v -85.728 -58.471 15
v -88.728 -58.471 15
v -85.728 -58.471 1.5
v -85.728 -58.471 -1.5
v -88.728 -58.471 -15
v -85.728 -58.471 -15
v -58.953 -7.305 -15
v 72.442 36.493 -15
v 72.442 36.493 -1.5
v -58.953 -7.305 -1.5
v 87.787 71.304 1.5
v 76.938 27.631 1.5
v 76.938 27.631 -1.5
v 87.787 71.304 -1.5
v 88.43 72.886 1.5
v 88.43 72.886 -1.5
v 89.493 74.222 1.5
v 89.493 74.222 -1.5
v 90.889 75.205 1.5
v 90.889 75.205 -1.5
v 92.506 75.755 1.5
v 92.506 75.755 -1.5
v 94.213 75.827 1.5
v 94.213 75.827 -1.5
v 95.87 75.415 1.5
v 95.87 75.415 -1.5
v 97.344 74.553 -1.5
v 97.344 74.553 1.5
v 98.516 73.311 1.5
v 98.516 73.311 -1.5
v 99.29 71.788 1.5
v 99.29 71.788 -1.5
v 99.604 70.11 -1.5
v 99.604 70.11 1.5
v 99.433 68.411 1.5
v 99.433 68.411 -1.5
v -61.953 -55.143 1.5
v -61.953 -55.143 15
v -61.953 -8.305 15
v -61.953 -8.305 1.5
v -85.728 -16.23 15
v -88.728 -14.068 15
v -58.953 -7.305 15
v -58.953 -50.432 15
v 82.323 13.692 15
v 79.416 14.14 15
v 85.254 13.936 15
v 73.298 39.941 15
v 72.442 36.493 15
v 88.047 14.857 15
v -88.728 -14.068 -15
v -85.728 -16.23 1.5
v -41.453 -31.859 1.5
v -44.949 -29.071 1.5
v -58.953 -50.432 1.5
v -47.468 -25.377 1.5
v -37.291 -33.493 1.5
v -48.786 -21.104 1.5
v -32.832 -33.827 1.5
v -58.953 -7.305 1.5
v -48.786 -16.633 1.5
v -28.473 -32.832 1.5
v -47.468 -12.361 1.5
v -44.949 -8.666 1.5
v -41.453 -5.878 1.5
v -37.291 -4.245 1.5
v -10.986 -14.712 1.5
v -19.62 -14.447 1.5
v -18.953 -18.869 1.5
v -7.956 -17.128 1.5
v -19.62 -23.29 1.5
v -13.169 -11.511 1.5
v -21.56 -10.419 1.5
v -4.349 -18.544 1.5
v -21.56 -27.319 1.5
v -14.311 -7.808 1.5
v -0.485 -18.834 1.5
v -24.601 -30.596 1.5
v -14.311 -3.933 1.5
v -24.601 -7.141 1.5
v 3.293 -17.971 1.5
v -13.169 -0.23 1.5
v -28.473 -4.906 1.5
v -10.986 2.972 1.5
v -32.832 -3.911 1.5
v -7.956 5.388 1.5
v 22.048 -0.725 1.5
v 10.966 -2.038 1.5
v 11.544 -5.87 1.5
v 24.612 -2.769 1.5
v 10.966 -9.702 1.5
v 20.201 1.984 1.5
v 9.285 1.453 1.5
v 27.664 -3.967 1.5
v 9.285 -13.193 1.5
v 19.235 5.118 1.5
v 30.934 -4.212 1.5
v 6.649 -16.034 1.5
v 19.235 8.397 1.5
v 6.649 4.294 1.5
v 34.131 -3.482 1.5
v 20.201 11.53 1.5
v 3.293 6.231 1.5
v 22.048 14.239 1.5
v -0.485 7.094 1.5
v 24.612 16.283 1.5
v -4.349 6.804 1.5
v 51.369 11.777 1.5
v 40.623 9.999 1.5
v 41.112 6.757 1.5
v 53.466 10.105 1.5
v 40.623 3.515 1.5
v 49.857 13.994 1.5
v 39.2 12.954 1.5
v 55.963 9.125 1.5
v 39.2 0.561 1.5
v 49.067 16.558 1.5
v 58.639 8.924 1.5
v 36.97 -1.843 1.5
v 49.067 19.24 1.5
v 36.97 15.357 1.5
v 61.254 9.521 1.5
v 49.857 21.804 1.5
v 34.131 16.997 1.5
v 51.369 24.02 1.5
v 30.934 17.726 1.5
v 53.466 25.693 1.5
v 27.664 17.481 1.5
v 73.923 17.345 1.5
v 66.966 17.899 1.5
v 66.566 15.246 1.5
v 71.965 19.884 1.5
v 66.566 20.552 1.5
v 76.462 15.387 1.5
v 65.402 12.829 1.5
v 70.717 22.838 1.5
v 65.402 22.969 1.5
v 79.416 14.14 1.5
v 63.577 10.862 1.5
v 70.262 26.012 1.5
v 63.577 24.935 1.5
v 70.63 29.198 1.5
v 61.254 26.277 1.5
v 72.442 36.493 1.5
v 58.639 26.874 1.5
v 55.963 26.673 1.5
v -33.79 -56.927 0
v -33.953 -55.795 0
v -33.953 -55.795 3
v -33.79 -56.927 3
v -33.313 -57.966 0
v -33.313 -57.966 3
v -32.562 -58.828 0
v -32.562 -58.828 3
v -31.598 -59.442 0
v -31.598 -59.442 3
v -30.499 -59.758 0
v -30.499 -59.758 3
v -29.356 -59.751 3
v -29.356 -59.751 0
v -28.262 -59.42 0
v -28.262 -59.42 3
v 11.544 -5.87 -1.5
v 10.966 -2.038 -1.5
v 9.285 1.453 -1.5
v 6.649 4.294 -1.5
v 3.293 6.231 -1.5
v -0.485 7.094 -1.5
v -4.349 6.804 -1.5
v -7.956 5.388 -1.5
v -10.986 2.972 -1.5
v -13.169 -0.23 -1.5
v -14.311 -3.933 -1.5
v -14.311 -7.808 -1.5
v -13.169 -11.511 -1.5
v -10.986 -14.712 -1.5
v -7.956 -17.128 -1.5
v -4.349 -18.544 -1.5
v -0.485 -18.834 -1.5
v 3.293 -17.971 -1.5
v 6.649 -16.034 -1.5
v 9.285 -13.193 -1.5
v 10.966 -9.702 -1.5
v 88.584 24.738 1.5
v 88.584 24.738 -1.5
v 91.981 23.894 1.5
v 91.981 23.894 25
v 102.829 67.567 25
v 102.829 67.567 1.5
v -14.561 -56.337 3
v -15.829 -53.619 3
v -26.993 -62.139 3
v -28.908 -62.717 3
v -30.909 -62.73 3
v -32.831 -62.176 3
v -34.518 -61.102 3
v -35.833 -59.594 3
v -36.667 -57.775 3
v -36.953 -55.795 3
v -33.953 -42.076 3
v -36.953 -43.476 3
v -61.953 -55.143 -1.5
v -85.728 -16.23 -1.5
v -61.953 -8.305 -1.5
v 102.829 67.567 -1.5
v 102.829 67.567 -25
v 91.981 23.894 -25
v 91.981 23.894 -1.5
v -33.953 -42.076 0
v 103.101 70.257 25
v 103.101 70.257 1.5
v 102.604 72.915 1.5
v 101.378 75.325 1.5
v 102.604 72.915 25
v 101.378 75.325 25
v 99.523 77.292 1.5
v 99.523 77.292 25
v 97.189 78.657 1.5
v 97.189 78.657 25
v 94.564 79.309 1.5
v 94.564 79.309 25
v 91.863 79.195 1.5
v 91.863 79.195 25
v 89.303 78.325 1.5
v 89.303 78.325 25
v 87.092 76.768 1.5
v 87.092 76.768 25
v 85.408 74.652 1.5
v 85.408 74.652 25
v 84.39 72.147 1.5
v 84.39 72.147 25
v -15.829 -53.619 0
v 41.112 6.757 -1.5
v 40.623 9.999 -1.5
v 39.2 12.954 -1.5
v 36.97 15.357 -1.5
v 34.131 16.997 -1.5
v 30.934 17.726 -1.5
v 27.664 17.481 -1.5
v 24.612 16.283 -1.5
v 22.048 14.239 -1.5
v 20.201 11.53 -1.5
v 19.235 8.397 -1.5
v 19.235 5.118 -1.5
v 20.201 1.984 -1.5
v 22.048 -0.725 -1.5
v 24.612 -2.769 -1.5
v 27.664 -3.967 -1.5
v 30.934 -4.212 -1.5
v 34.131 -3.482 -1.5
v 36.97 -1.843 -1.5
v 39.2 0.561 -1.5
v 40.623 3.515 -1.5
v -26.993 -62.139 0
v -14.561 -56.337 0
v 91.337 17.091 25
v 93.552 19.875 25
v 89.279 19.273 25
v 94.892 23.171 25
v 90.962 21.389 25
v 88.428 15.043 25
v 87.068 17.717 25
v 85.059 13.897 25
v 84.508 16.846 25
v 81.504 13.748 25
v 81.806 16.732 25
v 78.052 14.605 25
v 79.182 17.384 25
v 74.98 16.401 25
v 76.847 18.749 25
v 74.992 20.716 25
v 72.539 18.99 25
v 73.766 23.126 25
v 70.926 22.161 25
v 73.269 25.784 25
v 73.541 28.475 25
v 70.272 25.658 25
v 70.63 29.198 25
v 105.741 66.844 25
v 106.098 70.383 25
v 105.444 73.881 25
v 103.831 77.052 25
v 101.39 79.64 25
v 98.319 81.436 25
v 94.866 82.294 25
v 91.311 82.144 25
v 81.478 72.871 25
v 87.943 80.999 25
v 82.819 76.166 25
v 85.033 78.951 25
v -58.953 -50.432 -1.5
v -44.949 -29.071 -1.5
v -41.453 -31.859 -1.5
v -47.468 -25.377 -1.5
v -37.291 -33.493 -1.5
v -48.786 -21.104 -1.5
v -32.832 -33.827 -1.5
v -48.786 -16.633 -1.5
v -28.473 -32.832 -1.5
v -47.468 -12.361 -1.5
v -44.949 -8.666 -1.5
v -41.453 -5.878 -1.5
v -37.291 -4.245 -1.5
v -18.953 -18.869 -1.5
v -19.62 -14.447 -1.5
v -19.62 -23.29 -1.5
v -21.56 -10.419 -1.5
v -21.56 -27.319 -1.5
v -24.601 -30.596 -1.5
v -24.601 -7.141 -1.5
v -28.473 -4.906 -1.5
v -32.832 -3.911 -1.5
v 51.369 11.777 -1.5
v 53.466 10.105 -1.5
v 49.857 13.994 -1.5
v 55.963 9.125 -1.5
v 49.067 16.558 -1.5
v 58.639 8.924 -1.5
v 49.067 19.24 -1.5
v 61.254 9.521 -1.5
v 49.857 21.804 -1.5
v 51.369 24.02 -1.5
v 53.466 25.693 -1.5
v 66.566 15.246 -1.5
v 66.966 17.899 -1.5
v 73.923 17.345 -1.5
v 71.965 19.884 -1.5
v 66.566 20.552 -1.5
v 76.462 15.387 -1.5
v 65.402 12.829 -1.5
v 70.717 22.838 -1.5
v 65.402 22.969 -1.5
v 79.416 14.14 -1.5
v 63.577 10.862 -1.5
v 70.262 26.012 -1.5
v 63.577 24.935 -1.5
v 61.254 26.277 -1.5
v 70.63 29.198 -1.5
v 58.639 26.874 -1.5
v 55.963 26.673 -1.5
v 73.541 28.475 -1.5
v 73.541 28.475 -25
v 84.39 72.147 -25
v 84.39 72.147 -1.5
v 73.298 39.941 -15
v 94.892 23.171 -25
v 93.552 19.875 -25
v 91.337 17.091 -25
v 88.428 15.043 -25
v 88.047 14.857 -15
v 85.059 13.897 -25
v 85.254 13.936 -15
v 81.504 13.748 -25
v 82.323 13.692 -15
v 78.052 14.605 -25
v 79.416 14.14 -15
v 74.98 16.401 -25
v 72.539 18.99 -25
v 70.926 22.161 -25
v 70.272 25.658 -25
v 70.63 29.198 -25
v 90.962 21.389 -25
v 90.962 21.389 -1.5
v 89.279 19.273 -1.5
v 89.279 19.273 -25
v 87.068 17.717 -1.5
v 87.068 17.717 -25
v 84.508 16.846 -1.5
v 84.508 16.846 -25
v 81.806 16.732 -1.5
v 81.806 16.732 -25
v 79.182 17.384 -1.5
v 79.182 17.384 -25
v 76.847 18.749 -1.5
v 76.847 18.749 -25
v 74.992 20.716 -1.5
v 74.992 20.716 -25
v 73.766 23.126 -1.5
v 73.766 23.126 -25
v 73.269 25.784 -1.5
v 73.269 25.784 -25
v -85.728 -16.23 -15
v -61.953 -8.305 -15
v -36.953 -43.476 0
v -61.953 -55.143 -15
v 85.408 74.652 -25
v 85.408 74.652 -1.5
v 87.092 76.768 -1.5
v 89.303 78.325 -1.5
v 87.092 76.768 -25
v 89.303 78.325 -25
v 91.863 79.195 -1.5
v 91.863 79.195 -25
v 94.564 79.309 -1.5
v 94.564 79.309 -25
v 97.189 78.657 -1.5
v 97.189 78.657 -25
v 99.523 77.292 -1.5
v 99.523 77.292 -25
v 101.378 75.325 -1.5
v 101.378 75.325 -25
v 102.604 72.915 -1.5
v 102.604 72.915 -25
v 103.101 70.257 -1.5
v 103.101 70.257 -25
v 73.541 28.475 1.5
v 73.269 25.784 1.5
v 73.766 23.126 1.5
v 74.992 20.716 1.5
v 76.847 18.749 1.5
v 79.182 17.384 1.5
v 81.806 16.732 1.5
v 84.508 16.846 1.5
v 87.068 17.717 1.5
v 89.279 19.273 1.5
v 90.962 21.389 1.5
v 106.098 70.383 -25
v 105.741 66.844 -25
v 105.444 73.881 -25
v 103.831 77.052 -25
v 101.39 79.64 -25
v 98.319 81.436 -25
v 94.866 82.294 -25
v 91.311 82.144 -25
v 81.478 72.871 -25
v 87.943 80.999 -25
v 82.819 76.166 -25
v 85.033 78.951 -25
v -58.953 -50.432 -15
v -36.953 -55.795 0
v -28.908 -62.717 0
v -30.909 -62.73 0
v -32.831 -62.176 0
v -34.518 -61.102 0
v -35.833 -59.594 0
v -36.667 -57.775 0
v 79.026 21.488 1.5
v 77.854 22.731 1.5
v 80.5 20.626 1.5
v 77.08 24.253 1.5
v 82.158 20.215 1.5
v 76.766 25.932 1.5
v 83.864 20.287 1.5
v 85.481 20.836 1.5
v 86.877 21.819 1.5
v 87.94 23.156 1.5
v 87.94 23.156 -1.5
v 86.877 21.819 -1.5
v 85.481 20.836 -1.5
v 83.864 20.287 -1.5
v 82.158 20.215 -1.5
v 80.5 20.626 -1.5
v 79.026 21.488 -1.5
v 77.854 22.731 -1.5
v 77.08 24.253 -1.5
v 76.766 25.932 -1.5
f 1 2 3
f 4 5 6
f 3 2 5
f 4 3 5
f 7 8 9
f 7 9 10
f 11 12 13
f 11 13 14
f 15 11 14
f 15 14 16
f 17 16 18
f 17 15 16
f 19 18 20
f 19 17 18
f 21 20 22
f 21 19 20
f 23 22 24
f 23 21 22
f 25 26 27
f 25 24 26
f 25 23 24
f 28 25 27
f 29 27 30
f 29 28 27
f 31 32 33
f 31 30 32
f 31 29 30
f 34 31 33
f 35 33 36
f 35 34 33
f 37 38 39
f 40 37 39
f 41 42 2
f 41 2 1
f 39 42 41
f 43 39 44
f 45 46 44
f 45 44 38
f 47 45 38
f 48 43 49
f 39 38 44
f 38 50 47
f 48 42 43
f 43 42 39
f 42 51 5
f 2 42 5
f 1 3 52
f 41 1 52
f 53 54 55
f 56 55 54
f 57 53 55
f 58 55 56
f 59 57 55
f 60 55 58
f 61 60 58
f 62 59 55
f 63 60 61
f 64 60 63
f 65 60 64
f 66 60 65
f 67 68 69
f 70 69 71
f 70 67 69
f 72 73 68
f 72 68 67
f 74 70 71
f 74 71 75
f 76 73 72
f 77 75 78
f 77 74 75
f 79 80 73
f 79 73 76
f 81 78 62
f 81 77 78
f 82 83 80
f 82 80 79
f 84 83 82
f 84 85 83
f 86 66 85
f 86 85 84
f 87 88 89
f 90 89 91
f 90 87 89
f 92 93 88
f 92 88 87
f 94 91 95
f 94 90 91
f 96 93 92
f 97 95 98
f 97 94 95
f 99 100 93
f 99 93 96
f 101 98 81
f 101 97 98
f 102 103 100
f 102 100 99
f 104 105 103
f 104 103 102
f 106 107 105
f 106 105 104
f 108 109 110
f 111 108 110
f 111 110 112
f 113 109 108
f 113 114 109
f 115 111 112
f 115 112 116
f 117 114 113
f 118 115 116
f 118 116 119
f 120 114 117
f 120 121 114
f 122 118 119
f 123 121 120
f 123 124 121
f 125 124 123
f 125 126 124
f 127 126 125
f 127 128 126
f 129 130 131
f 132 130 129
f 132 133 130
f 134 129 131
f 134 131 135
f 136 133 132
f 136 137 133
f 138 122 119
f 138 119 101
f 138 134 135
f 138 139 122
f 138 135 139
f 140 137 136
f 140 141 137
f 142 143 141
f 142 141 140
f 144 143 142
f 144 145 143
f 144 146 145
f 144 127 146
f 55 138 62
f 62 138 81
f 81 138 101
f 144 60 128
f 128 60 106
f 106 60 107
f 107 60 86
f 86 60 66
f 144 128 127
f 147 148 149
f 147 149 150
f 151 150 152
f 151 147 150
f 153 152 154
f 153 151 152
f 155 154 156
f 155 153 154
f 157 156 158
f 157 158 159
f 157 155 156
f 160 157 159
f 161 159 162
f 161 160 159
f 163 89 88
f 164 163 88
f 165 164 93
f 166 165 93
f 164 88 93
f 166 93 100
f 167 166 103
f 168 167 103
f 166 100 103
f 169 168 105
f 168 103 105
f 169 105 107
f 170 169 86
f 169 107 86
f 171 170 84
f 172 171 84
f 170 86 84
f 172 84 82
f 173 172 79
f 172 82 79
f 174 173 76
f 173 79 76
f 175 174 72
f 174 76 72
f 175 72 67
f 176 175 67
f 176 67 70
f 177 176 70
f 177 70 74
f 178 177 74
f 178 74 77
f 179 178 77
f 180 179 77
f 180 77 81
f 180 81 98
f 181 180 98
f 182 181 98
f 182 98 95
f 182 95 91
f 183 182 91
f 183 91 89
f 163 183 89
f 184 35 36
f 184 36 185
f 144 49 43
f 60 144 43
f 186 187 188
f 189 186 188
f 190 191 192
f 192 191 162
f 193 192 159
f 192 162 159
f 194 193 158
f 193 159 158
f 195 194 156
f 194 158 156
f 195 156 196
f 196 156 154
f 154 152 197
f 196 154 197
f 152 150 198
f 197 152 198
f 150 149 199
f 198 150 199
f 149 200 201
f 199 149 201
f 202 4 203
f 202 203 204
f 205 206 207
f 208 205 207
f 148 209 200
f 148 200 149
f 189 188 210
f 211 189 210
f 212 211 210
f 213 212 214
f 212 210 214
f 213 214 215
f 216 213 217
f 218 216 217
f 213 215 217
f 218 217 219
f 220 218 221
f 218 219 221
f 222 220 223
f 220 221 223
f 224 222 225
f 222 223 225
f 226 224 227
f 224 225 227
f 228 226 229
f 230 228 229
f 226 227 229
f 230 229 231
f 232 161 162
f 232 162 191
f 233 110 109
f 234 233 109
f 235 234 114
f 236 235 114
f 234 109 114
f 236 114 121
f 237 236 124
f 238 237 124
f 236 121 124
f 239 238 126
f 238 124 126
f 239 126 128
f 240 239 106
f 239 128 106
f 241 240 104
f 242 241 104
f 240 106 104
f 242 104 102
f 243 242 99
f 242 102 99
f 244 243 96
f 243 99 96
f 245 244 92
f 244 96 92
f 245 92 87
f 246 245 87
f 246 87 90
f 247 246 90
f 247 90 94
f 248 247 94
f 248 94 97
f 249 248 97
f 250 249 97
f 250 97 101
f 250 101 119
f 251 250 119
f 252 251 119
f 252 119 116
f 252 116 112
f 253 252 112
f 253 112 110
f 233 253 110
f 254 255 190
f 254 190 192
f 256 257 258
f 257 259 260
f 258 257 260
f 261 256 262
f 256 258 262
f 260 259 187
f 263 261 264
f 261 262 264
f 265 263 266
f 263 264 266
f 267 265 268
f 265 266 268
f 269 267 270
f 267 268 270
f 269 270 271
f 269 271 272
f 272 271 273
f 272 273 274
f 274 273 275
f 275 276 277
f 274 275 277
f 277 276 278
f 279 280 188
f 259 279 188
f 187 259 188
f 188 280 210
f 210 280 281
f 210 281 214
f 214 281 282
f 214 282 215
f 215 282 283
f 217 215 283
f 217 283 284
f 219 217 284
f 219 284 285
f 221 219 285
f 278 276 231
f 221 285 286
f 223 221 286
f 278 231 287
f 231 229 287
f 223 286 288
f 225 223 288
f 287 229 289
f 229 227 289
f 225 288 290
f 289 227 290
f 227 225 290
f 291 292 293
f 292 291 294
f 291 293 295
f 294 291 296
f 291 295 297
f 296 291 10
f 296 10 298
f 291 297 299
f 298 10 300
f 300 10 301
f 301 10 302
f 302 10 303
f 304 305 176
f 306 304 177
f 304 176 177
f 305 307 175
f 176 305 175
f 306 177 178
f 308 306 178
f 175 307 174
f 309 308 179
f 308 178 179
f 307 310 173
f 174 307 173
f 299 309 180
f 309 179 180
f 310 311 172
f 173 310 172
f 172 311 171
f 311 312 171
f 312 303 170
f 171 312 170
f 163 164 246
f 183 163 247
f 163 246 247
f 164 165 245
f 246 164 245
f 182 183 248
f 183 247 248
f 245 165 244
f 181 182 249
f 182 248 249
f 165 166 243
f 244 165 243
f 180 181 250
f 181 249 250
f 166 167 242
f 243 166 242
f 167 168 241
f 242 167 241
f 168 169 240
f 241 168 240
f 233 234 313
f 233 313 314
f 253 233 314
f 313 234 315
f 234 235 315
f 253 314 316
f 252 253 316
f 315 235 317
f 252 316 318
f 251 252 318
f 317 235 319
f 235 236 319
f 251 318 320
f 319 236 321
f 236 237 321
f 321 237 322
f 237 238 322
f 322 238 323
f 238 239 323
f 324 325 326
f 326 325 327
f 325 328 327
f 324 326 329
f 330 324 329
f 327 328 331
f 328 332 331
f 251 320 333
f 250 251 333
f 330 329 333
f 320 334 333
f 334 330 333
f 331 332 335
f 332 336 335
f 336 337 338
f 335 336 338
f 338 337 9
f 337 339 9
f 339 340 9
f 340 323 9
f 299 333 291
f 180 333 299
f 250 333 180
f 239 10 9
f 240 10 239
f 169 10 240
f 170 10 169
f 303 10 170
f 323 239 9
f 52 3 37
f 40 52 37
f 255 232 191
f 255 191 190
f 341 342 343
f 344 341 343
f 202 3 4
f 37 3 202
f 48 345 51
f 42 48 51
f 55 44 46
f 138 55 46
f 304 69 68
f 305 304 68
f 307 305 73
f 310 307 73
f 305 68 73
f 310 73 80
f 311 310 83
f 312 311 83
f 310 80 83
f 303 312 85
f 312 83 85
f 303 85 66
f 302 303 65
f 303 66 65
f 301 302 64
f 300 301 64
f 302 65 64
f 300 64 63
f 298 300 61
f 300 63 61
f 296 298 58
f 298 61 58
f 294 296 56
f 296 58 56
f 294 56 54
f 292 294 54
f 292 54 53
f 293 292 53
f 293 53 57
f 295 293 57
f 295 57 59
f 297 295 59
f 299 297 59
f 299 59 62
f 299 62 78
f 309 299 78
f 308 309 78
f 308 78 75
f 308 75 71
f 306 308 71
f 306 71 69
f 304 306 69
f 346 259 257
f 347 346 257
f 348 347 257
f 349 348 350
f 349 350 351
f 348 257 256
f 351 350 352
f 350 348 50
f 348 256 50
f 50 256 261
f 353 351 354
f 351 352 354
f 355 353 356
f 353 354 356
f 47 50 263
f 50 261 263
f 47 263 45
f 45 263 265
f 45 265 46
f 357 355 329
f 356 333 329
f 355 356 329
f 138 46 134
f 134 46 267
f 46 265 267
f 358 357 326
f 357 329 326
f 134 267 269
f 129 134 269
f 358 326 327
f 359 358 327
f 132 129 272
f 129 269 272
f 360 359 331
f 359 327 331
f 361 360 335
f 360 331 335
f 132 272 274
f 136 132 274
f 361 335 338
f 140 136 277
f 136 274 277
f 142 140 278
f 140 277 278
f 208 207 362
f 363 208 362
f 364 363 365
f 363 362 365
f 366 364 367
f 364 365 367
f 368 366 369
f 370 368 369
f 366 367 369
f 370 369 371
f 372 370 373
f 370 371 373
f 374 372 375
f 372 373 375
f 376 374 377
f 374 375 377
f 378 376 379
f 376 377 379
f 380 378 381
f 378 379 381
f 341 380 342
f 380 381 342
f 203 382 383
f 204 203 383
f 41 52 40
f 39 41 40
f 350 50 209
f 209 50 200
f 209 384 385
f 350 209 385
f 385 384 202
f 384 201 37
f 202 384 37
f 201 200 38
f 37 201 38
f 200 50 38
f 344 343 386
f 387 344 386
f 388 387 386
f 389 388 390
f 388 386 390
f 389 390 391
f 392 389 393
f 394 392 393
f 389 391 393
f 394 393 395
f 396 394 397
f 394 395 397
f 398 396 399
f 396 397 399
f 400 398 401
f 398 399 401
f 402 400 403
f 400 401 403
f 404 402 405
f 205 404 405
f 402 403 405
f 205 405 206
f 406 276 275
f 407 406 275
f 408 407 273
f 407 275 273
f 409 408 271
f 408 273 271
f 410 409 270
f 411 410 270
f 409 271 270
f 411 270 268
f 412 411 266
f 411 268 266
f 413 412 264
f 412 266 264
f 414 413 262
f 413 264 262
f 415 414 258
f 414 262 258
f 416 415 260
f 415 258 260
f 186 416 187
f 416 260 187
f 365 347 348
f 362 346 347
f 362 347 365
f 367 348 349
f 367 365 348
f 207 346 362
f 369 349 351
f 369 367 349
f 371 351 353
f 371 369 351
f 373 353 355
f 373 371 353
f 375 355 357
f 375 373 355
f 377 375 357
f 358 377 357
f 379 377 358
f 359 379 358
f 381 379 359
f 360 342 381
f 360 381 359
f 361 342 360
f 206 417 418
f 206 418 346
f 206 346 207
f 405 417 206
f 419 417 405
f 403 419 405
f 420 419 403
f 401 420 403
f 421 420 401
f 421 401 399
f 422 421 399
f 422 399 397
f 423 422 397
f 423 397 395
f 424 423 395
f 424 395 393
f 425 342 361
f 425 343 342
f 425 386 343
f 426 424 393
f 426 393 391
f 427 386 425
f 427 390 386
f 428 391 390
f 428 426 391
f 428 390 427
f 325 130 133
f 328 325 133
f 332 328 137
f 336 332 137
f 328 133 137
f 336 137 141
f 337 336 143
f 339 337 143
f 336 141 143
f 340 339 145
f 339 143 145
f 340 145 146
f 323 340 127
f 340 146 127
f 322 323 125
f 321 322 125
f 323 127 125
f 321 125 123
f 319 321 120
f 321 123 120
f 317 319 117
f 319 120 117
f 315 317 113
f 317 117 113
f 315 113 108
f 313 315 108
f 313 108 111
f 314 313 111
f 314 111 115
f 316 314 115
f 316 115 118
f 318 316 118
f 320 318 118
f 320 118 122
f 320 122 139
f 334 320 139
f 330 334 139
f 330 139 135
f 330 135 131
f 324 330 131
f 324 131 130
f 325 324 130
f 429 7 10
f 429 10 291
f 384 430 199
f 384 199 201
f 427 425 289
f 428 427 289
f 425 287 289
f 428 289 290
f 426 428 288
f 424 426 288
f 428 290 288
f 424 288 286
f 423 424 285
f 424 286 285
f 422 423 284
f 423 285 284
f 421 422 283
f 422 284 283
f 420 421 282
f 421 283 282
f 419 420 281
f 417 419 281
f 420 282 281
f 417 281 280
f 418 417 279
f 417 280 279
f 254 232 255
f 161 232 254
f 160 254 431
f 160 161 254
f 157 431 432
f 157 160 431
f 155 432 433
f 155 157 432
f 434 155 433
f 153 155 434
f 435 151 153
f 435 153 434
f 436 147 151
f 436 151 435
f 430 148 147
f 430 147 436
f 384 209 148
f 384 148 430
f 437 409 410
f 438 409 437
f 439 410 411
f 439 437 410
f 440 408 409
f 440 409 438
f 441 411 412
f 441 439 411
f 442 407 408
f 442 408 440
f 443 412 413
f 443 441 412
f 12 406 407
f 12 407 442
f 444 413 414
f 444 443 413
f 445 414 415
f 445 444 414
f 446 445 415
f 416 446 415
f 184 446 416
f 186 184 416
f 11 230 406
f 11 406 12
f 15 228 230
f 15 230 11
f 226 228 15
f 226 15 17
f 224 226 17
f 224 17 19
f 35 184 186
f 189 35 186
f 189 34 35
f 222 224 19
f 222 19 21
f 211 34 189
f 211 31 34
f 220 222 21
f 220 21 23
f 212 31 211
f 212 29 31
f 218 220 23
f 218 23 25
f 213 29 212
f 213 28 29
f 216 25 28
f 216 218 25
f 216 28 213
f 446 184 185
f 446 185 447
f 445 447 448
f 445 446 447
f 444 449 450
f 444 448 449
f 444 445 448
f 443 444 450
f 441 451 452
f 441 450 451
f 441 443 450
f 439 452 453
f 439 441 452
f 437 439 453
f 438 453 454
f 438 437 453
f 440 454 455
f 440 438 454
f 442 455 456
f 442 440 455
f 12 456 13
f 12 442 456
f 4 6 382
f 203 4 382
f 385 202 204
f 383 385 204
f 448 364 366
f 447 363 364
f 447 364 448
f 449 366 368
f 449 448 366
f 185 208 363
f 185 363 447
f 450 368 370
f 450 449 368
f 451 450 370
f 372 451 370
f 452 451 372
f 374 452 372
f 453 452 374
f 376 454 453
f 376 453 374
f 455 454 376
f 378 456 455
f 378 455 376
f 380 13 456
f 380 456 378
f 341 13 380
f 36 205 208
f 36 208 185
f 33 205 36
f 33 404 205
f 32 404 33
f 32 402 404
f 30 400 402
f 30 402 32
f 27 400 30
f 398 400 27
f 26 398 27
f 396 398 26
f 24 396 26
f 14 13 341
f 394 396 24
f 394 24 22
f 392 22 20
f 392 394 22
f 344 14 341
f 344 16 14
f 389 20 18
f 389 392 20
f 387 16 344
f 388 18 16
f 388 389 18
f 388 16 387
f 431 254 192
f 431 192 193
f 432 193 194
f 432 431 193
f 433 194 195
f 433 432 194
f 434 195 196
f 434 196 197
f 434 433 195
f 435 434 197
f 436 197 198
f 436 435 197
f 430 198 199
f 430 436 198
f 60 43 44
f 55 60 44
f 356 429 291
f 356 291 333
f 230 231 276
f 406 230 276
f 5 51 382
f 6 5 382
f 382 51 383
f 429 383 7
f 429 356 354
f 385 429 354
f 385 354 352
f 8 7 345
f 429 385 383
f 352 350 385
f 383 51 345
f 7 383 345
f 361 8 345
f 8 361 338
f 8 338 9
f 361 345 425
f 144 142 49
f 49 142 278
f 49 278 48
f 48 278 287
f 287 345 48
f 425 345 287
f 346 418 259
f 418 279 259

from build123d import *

# Parameters (mm, degrees)
ESTRUSIONE_ESTRUSIONE1_DEPTH = 15
TAGLIO_ESTRUSIONE1_DEPTH     = 13.5
SCHIZZO3_R                   = 15
SCHIZZO3_R_2                 = 13
SCHIZZO3_R_3                 = 11
SCHIZZO3_R_4                 = 9
TAGLIO_ESTRUSIONE2_DEPTH     = 17.5
ESTRUSIONE_ESTRUSIONE3_DEPTH = 25
TAGLIO_ESTRUSIONE4_DEPTH     = 23.5
TAGLIO_ESTRUSIONE5_DEPTH     = 23.5
TAGLIO_ESTRUSIONE6_DEPTH     = 27.5
ESTRUSIONE_SOTTILE2_START    = -15
ESTRUSIONE_SOTTILE2_DEPTH    = 30
ESTRUSIONE_ESTRUSIONE4_DEPTH = 1.5
ESTRUSIONE_SOTTILE3_DEPTH    = 3


with BuildPart() as part:
    # Schizzo1 → Estrusione-Estrusione1 (new body, symmetric)
    with BuildSketch(Plane.XY):
        Polygon((-61.953104657, -55.142919533), (-61.953104657, -5.142919533), (88.046895343, 44.857080467), (88.046895343, 14.857080467), align=None)
    extrude(amount=ESTRUSIONE_ESTRUSIONE1_DEPTH, both=True)

    # Schizzo2 → Taglio-Estrusione1 (cut)
    with BuildSketch(Plane.XY.offset(15)):
        Polygon((85.046895343, 16.767669539), (85.046895343, 40.694802807), (-58.953104657, -7.305197193), (-58.953104657, -50.432330461), align=None)
    taglio_estrusione1 = extrude(amount=-TAGLIO_ESTRUSIONE1_DEPTH, mode=Mode.SUBTRACT)

    # Specchia1: Taglio-Estrusione1 across plane
    add(taglio_estrusione1.mirror(Plane.XY), mode=Mode.SUBTRACT)

    # Schizzo3 → Taglio-Estrusione2 (cut, through all)
    with BuildSketch(Plane.XY.offset(1.5)):
        with Locations((-33.953104657, -18.868763827)):
            Circle(SCHIZZO3_R)
        with Locations((-1.456420476, -5.870090155)):
            Circle(SCHIZZO3_R_2)
        with Locations((30.111787014, 6.757192842)):
            Circle(SCHIZZO3_R_3)
        with Locations((57.966087741, 17.898913132)):
            Circle(SCHIZZO3_R_4)
    extrude(amount=-TAGLIO_ESTRUSIONE2_DEPTH, mode=Mode.SUBTRACT)

    # Schizzo4 → Estrusione-Estrusione3 (add, symmetric)
    with BuildSketch(Plane.XY):
        with BuildLine():
            Line((70.629518485, 29.197898059), (81.478220515, 72.870608809))
            ThreePointArc((81.478220515, 72.870608809), (96.623057398, 81.988389009), (105.740837598, 66.843552126))
            Line((105.740837598, 66.843552126), (94.892135568, 23.170841376))
            ThreePointArc((94.892135568, 23.170841376), (79.747298685, 14.053061176), (70.629518485, 29.197898059))
        make_face()
    extrude(amount=ESTRUSIONE_ESTRUSIONE3_DEPTH, both=True)

    # Schizzo5 → Taglio-Estrusione4 (cut)
    with BuildSketch(Plane.XY.offset(25)):
        with BuildLine():
            Line((91.980621518, 23.894088178), (102.829323548, 67.566798928))
            ThreePointArc((102.829323548, 67.566798928), (95.899810596, 79.076874959), (84.389734565, 72.147362007))
            Line((84.389734565, 72.147362007), (73.541032535, 28.474651257))
            ThreePointArc((73.541032535, 28.474651257), (80.470545487, 16.964575226), (91.980621518, 23.894088178))
        make_face()
    extrude(amount=-TAGLIO_ESTRUSIONE4_DEPTH, mode=Mode.SUBTRACT)

    # Schizzo6 → Taglio-Estrusione5 (cut)
    with BuildSketch(Plane(origin=(0, 0, -25), x_dir=(-1, 0, 0), z_dir=(0, 0, -1))):
        with BuildLine():
            Line((-73.541032535, 28.474651257), (-84.389734565, 72.147362007))
            ThreePointArc((-84.389734565, 72.147362007), (-95.899810596, 79.076874959), (-102.829323548, 67.566798928))
            Line((-102.829323548, 67.566798928), (-91.980621518, 23.894088178))
            ThreePointArc((-91.980621518, 23.894088178), (-80.470545487, 16.964575226), (-73.541032535, 28.474651257))
        make_face()
    extrude(amount=-TAGLIO_ESTRUSIONE5_DEPTH, mode=Mode.SUBTRACT)

    # Schizzo7 → Taglio-Estrusione6 (cut, through all)
    with BuildSketch(Plane.XY.offset(1.5)):
        with BuildLine():
            Line((76.937798926, 27.630863321), (87.786500957, 71.303574071))
            ThreePointArc((87.786500957, 71.303574071), (95.056022661, 75.680108567), (99.432557157, 68.410586863))
            Line((99.432557157, 68.410586863), (88.583855126, 24.737876113))
            ThreePointArc((88.583855126, 24.737876113), (81.314333422, 20.361341617), (76.937798926, 27.630863321))
        make_face()
    extrude(amount=-TAGLIO_ESTRUSIONE6_DEPTH, mode=Mode.SUBTRACT)

    # Schizzo8 → Estrusione-Sottile2 (add)
    with BuildSketch(Plane.XY.offset(ESTRUSIONE_SOTTILE2_START)):
        Polygon((-61.953104657, -5.142919533), (-88.727527571, -14.067727171), (-88.727527571, -58.470604197), (-85.727527571, -58.470604197), (-85.727527571, -16.230004831), (-61.004421359, -7.988969427), align=None)
    extrude(amount=ESTRUSIONE_SOTTILE2_DEPTH)

    # Schizzo9 → Estrusione-Estrusione4 (add, symmetric)
    with BuildSketch(Plane.XY):
        Polygon((-85.727527571, -58.470604197), (-61.953104657, -55.142919533), (-61.953104657, -8.305197193), (-85.727527571, -16.230004831), align=None)
    extrude(amount=ESTRUSIONE_ESTRUSIONE4_DEPTH, both=True)

    # Schizzo11 → Estrusione-Sottile3 (add)
    with BuildSketch(Plane.XY):
        with BuildLine():
            Line((-33.953104657, -42.076252866), (-33.953104657, -55.795467437))
            ThreePointArc((-33.953104657, -55.795467437), (-32.101805724, -59.169350026), (-28.261562796, -59.420199997))
            Line((-28.261562796, -59.420199997), (-15.829441857, -53.618543559))
            Line((-15.829441857, -53.618543559), (-14.560785461, -56.337092979))
            Line((-14.560785461, -56.337092979), (-26.9929064, -62.138749417))
            ThreePointArc((-26.9929064, -62.138749417), (-33.713331525, -61.699761968), (-36.953104657, -55.795467437))
            Line((-36.953104657, -55.795467437), (-36.953104657, -42.076252866))
            Line((-36.953104657, -42.076252866), (-33.953104657, -42.076252866))
        make_face()
    extrude(amount=ESTRUSIONE_SOTTILE3_DEPTH)


solid = part.part
